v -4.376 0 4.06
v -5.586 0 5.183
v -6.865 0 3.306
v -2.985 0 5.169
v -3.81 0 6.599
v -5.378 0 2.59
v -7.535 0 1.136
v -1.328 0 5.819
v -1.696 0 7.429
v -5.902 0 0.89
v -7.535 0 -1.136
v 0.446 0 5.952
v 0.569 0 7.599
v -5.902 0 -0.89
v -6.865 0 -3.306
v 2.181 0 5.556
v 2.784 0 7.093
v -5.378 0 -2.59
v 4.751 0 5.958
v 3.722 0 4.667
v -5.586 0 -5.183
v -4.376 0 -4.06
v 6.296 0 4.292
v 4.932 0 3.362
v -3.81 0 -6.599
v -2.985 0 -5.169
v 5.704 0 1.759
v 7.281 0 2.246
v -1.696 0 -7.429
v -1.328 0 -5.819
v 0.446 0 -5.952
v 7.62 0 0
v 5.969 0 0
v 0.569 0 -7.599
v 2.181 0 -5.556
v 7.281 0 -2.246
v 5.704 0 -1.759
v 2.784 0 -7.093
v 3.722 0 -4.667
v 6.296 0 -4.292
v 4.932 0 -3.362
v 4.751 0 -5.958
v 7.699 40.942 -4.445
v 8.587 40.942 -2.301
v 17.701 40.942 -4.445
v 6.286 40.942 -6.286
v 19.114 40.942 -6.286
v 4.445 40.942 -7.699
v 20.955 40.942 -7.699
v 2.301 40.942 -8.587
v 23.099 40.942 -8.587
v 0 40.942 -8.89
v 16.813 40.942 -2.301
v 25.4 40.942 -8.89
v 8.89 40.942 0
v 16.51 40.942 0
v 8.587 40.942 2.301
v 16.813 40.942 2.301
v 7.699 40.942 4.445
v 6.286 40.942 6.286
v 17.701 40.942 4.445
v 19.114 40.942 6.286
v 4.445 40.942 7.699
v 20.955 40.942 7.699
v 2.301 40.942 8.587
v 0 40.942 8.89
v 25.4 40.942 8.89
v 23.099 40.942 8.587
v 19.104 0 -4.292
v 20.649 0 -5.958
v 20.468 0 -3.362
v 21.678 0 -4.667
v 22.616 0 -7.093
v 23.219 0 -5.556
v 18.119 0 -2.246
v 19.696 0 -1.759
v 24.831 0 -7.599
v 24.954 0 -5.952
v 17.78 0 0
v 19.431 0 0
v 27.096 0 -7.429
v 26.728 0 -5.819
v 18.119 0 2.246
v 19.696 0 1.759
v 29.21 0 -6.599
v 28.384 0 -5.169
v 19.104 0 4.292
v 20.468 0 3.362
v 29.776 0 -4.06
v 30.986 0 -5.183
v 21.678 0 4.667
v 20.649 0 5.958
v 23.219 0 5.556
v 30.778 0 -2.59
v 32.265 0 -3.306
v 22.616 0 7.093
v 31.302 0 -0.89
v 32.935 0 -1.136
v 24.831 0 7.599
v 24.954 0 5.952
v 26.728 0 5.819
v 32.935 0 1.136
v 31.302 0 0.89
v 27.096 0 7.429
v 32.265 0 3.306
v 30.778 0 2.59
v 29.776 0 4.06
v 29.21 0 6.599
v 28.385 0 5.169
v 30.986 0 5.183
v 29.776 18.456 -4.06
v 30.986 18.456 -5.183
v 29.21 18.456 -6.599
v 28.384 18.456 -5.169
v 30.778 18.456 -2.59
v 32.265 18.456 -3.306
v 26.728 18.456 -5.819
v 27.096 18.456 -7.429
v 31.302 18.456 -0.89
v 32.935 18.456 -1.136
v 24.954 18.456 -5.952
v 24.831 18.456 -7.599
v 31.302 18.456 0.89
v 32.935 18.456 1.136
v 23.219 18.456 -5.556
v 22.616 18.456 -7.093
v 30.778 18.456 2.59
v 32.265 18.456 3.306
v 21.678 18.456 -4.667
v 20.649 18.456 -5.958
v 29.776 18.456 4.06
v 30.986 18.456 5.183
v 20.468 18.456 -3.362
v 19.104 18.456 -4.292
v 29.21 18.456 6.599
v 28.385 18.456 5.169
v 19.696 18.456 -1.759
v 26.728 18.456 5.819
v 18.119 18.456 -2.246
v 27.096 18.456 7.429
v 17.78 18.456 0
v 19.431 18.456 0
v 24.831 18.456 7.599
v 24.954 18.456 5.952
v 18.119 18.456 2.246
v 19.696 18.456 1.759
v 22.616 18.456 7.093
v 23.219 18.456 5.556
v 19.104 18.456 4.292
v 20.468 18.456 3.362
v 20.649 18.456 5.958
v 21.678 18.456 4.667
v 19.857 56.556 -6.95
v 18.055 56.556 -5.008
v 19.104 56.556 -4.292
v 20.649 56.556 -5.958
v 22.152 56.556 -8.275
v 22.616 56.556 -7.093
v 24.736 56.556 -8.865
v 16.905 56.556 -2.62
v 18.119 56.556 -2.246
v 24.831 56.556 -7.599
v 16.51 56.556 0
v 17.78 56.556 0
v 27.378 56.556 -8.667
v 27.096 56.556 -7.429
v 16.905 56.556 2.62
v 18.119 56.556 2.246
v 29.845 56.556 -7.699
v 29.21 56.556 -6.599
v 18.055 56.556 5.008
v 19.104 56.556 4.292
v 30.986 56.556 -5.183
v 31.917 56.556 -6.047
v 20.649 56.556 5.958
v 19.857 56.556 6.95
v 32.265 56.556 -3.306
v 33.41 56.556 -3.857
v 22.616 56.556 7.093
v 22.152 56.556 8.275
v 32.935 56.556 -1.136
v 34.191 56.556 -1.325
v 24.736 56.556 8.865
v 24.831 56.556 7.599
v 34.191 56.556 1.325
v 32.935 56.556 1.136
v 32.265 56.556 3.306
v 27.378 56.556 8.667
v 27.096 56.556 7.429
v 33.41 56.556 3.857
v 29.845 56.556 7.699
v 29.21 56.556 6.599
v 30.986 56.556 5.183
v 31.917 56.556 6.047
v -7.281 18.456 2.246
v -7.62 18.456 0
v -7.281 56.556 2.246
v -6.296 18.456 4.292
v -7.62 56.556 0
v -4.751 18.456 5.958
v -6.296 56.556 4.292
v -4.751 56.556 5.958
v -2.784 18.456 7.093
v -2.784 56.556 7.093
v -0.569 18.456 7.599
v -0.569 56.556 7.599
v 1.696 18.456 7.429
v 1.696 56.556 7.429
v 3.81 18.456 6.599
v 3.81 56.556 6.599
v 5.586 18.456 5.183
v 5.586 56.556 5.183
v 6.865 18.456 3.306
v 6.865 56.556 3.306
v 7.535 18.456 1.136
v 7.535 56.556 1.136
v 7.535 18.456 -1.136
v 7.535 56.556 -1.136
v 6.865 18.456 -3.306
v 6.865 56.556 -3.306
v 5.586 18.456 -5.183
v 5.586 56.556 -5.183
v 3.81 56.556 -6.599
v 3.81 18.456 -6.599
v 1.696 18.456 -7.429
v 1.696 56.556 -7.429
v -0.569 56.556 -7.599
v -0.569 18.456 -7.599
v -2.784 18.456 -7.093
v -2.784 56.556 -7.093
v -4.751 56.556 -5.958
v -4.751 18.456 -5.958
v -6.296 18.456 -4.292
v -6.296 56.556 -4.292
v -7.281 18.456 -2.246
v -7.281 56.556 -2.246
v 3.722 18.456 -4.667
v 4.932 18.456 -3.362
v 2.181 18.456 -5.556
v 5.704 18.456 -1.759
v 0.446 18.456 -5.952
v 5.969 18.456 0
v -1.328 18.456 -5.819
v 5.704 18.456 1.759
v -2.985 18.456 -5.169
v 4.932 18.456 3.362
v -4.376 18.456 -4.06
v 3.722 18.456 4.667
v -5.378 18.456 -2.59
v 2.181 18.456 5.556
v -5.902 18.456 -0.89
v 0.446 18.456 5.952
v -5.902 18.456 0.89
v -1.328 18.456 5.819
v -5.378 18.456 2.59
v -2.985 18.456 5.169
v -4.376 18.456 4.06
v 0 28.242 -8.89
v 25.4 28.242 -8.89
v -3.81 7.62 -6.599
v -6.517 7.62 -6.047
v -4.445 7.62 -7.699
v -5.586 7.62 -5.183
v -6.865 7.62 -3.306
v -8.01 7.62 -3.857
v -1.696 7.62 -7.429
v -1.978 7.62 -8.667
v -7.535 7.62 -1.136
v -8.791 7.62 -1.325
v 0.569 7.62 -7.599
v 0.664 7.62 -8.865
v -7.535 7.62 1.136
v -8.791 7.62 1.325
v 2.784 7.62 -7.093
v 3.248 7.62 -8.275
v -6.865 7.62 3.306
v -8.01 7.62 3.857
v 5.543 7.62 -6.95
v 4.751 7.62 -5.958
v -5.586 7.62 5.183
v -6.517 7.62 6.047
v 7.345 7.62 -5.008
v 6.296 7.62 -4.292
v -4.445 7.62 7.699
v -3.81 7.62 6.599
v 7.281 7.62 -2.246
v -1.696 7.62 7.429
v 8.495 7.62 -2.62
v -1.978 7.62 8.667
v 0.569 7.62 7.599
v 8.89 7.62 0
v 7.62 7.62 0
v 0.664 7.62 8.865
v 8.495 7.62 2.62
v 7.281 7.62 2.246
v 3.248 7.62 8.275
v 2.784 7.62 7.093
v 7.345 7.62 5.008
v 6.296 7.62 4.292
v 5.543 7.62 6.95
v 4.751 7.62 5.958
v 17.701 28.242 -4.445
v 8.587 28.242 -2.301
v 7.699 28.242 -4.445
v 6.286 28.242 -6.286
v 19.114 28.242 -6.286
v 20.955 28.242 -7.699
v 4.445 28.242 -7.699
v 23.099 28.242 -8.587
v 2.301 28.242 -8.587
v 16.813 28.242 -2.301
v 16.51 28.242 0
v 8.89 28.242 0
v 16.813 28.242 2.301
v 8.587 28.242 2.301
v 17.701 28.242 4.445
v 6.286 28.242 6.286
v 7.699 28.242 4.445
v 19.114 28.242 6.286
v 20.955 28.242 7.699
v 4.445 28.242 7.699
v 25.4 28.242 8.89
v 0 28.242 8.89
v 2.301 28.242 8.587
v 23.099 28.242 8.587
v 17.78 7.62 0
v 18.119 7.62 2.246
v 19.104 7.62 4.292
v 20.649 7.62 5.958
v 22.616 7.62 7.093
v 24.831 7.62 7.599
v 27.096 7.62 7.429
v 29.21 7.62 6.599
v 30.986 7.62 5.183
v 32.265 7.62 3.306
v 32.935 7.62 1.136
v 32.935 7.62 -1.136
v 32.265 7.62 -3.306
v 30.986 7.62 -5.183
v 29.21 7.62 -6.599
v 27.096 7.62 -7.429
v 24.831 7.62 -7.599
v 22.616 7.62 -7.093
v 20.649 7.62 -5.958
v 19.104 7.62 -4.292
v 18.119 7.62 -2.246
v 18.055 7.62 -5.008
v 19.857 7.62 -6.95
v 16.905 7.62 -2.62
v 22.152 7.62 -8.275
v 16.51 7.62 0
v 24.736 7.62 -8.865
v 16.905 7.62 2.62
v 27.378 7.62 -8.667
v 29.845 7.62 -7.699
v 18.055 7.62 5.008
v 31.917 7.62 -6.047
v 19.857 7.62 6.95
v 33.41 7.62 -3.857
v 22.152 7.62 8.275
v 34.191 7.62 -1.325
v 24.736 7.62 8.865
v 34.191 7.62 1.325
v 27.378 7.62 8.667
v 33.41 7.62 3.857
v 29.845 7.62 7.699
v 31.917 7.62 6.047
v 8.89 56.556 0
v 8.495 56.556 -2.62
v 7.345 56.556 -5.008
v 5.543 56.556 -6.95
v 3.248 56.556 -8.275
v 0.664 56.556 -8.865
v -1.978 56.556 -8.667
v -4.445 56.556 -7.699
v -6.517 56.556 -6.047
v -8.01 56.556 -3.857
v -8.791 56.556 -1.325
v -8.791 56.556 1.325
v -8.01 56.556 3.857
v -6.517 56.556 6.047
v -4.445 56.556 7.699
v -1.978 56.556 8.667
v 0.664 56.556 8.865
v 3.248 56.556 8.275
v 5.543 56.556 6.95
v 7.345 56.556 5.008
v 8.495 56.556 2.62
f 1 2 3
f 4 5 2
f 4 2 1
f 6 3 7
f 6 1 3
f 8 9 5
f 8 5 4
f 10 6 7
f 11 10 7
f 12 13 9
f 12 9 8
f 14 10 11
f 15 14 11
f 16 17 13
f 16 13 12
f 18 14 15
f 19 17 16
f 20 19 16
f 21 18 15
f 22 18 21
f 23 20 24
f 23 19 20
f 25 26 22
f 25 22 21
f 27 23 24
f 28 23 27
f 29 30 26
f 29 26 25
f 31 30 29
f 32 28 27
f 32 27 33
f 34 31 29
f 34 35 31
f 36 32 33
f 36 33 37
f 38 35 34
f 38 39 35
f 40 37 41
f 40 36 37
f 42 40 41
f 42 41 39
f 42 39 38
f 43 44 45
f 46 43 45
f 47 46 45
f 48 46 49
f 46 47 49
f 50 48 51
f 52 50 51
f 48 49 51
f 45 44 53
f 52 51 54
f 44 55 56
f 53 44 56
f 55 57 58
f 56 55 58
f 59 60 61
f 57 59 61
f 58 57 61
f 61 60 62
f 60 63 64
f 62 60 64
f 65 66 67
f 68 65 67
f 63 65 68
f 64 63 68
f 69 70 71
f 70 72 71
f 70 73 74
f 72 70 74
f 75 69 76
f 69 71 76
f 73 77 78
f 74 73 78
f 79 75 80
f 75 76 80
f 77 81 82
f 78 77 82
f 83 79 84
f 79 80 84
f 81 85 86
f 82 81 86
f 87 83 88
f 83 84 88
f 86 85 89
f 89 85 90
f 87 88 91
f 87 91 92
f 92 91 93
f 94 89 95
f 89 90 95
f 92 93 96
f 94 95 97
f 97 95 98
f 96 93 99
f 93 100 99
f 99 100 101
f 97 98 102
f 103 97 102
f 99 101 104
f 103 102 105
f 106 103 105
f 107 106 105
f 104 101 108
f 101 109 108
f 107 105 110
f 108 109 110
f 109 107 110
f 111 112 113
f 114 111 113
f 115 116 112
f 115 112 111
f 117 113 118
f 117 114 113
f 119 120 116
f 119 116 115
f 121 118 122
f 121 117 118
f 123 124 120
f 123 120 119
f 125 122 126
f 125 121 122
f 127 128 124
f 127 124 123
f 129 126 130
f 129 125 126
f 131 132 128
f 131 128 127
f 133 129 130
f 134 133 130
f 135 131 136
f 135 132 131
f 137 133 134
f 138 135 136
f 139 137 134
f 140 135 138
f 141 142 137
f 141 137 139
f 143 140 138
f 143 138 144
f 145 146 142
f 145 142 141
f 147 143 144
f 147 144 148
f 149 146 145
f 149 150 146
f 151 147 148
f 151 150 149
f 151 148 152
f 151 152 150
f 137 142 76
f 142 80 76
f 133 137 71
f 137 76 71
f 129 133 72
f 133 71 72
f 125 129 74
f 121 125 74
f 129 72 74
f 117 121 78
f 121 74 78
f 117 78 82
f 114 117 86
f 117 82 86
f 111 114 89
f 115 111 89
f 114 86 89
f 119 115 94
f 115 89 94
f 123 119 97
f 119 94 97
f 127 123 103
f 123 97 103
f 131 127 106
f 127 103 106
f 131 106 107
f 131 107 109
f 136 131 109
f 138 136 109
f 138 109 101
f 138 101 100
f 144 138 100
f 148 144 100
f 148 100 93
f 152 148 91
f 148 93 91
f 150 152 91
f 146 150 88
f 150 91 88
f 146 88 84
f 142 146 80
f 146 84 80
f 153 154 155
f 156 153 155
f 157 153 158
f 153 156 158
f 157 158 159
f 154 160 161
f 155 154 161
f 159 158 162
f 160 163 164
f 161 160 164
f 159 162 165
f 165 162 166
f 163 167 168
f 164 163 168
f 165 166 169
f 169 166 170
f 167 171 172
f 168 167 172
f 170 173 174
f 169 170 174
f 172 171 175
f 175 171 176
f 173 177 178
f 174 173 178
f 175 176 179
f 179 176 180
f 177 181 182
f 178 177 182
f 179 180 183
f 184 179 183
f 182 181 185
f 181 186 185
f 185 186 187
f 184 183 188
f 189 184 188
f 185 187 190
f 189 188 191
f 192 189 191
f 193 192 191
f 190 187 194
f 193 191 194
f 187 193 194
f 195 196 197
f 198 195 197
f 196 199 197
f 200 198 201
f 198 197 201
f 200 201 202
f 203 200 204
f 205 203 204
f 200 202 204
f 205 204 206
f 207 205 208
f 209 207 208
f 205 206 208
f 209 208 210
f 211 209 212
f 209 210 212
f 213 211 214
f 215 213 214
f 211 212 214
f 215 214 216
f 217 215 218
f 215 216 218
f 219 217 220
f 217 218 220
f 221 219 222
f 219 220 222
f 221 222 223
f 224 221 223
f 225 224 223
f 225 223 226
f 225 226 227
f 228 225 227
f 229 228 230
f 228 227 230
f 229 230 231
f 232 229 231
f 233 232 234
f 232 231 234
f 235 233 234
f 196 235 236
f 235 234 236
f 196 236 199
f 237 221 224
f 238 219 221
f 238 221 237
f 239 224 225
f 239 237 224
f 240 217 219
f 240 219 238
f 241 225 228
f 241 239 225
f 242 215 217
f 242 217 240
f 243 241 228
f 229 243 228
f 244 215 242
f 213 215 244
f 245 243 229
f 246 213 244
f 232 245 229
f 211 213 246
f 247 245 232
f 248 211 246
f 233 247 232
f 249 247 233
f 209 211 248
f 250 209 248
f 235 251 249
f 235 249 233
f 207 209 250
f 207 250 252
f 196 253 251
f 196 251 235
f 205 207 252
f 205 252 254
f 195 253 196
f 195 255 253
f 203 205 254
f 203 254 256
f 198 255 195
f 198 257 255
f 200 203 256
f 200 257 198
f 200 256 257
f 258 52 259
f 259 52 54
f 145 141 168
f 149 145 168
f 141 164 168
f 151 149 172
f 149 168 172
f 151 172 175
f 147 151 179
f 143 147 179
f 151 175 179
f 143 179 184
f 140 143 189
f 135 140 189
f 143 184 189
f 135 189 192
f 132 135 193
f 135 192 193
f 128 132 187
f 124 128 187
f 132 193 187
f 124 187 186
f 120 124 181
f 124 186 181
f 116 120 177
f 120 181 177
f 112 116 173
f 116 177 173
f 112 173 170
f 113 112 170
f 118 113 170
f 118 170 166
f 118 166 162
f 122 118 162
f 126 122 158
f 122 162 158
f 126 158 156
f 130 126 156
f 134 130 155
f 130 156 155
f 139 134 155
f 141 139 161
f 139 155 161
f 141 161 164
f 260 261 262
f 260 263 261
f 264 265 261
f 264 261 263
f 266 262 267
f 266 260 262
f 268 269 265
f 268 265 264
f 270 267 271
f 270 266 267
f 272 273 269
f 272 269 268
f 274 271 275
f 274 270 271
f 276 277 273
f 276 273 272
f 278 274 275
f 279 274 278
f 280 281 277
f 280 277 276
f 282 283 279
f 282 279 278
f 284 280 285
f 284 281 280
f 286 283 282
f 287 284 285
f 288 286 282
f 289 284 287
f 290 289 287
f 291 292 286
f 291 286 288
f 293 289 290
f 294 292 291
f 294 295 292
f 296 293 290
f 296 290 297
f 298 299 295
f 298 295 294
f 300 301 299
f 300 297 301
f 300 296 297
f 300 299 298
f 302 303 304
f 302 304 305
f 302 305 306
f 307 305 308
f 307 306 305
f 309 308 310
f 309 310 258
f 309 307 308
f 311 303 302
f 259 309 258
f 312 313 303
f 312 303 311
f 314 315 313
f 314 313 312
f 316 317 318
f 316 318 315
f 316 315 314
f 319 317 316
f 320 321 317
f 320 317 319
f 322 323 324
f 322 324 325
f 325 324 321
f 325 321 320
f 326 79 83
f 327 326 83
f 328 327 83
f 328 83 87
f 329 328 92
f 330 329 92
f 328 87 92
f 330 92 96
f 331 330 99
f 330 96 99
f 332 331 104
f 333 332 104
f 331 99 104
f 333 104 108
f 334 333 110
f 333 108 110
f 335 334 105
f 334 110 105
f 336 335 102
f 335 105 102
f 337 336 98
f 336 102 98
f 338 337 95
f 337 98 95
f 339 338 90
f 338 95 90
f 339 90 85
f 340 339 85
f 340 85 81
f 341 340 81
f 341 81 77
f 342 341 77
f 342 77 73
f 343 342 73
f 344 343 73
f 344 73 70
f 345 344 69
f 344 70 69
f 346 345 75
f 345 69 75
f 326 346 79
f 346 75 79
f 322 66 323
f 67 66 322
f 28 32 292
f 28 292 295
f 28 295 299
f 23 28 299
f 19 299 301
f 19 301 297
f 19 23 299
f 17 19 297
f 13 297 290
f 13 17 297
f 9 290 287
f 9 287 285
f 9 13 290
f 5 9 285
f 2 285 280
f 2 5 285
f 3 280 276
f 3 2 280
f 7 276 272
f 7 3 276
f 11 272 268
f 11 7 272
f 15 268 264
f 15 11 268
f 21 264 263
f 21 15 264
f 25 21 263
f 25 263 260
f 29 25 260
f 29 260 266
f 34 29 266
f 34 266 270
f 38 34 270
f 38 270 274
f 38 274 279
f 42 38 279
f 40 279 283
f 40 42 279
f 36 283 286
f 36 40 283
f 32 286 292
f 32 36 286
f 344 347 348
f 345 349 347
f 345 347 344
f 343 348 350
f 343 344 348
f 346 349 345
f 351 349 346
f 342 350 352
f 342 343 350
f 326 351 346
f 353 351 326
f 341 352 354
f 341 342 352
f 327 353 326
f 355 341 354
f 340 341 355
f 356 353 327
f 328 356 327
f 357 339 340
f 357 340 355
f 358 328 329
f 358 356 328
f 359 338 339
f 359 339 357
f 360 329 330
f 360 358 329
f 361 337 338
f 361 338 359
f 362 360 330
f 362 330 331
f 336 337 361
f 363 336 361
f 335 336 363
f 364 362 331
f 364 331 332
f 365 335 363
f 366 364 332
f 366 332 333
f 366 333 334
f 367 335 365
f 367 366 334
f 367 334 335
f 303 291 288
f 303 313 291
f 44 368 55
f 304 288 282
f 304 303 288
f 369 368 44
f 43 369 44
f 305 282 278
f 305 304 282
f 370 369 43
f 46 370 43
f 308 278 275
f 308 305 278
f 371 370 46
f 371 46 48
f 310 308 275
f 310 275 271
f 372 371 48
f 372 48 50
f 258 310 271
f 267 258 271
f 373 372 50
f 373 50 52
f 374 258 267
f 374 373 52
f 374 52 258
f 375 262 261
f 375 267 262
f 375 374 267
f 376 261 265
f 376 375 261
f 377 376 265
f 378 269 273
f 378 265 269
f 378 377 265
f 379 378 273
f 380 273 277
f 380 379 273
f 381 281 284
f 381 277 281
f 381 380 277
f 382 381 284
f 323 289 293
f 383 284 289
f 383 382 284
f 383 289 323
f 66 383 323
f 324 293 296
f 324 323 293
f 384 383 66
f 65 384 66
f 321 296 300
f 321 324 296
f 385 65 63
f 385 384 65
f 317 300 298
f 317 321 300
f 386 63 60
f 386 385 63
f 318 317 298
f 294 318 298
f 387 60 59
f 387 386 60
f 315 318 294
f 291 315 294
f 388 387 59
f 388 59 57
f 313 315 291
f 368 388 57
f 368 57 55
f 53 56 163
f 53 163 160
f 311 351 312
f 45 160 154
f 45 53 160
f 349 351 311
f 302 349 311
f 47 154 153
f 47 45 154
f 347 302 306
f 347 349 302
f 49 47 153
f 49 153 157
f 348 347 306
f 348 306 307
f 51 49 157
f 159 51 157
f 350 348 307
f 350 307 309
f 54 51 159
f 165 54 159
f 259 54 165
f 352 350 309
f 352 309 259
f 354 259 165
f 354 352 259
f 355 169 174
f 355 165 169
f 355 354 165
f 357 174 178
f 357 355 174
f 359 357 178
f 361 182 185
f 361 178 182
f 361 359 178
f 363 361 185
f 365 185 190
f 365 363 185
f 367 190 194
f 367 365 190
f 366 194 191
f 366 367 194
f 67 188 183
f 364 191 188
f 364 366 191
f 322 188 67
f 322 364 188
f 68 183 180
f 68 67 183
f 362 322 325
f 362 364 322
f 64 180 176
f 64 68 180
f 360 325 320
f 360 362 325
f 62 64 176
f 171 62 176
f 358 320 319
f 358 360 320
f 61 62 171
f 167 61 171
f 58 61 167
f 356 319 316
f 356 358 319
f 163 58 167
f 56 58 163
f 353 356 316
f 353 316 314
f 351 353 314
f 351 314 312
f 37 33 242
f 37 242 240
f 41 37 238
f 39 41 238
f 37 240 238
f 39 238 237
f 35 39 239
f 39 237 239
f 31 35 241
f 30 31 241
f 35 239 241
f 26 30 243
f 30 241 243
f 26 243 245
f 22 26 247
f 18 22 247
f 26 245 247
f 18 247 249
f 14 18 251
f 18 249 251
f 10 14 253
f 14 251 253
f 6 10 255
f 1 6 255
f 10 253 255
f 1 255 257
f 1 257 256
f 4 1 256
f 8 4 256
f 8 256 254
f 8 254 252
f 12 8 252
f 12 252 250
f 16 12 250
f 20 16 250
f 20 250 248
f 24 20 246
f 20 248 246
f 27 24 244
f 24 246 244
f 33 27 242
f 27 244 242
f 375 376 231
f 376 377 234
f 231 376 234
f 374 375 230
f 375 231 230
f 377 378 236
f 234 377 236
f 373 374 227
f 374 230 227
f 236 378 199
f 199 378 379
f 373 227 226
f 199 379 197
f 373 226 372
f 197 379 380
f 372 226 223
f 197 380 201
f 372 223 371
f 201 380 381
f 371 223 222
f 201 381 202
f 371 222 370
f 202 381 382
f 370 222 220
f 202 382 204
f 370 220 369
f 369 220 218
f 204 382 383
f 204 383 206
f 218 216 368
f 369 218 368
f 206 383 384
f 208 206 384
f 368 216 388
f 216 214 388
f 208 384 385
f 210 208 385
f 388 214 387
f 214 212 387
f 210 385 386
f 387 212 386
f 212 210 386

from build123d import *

# Parameters (mm, degrees)
F1_R          = 8.89
F1_R_2        = 5.969
F3_R          = 8.89
F3_R_2        = 7.62
F4_DEPTH      = 7.62
F5_DEPTH      = 25.4
F5_DEPTH_BACK = 25.4
F6_R          = 7.62
F7_R          = 7.62
F8_DEPTH      = 38.1
F0_W          = 25.4
F0_H          = 12.7
F9_DEPTH      = 8.89
F9_DEPTH_BACK = 8.89
F10_DEPTH     = 25.4
F11_DEPTH     = 38.1


with BuildPart() as f2:
    # F2: sweep along a path in F0
    with BuildLine(Plane.XY) as f2_path:
        Line((0, 0), (0, 124.469906))
        ThreePointArc((0, 124.469906), (12.7, 137.169906), (25.4, 124.469906))
        Line((25.4, 124.469906), (25.4, 0))
    # F1 (on Front) → F2 (sweep)
    with BuildSketch(Plane.XZ):
        Circle(F1_R)
        Circle(F1_R_2, mode=Mode.SUBTRACT)
    sweep(path=f2_path.line)

    # F3 (on face) → F4 (cut)
    with BuildSketch(Plane.XZ):
        Circle(F3_R)
        Circle(F3_R_2, mode=Mode.SUBTRACT)
        with BuildLine():
            ThreePointArc((34.29, 0), (25.4, 8.89), (16.51, 0))
            ThreePointArc((16.51, 0), (25.4, -8.89), (34.29, 0))
        make_face()
        with BuildLine():
            ThreePointArc((33.02, 0), (25.4, -7.62), (17.78, 0))
            ThreePointArc((17.78, 0), (25.4, 7.62), (33.02, 0))
        make_face(mode=Mode.SUBTRACT)
    extrude(amount=-F4_DEPTH, mode=Mode.SUBTRACT)

    # F0 (on Top) → F5 (cut, two sides)
    with BuildSketch(Plane.XY) as f5_sk:
        with BuildLine():
            Line((-27.3511596024, 56.5561708785), (0, 56.5561708785))
            Line((0, 56.5561708785), (0, 124.469906))
            ThreePointArc((0, 124.469906), (3.7197438789, 133.4501621211), (12.7, 137.169906))
            ThreePointArc((12.7, 137.169906), (21.6802561211, 133.4501621211), (25.4, 124.469906))
            Line((25.4, 124.469906), (25.4, 56.5561708785))
            Line((25.4, 56.5561708785), (45.1116599143, 56.5561708785))
            Line((45.1116599143, 56.5561708785), (45.1116599143, 146.6434597969))
            Line((45.1116599143, 146.6434597969), (-27.3511596024, 146.6434597969))
            Line((-27.3511596024, 146.6434597969), (-27.3511596024, 56.5561708785))
        make_face()
        with BuildLine():
            Line((0, 124.469906), (0, 56.5561708785))
            Line((0, 56.5561708785), (12.7, 56.5561708785))
            Line((12.7, 56.5561708785), (12.7, 137.169906))
            ThreePointArc((12.7, 137.169906), (3.7197438789, 133.4501621211), (0, 124.469906))
        make_face()
        with BuildLine():
            Line((12.7, 56.5561708785), (25.4, 56.5561708785))
            Line((25.4, 56.5561708785), (25.4, 124.469906))
            ThreePointArc((25.4, 124.469906), (21.6802561211, 133.4501621211), (12.7, 137.169906))
            Line((12.7, 137.169906), (12.7, 56.5561708785))
        make_face()
    extrude(amount=-F5_DEPTH, mode=Mode.SUBTRACT)
    extrude(f5_sk.sketch, amount=F5_DEPTH_BACK, mode=Mode.SUBTRACT)

    # F6 (on face) + F7 (on face) → F8 (cut)
    with BuildSketch(Plane(origin=(0, 56.5561708785, 0), x_dir=(-1, 0, 0), z_dir=(0, 1, 0))):
        with Locations((-25.4, 0)):
            Circle(F6_R)
    with BuildSketch(Plane(origin=(0, 56.5561708785, 0), x_dir=(-1, 0, 0), z_dir=(0, 1, 0))):
        Circle(F7_R)
    extrude(amount=-F8_DEPTH, mode=Mode.SUBTRACT)

    # F0 (on Top) → F9 (join, two sides)
    with BuildSketch(Plane.XY) as f9_sk:
        with Locations((12.7, 34.5915263355)):
            Rectangle(F0_W, F0_H)
    extrude(amount=F9_DEPTH)
    extrude(f9_sk.sketch, amount=-F9_DEPTH_BACK)

    # F7 (on face) + F6 (on face) → F10 (cut)
    with BuildSketch(Plane(origin=(0, 56.5561708785, 0), x_dir=(-1, 0, 0), z_dir=(0, 1, 0))):
        Circle(F7_R)
    with BuildSketch(Plane(origin=(0, 56.5561708785, 0), x_dir=(-1, 0, 0), z_dir=(0, 1, 0))):
        with Locations((-25.4, 0)):
            Circle(F6_R)
    extrude(amount=-F10_DEPTH, mode=Mode.SUBTRACT)

    # F7 (on face) + F6 (on face) → F11 (cut)
    with BuildSketch(Plane(origin=(0, 56.5561708785, 0), x_dir=(-1, 0, 0), z_dir=(0, 1, 0))):
        Circle(F7_R)
    with BuildSketch(Plane(origin=(0, 56.5561708785, 0), x_dir=(-1, 0, 0), z_dir=(0, 1, 0))):
        with Locations((-25.4, 0)):
            Circle(F6_R)
    extrude(amount=-F11_DEPTH, mode=Mode.SUBTRACT)


solid = f2.part
